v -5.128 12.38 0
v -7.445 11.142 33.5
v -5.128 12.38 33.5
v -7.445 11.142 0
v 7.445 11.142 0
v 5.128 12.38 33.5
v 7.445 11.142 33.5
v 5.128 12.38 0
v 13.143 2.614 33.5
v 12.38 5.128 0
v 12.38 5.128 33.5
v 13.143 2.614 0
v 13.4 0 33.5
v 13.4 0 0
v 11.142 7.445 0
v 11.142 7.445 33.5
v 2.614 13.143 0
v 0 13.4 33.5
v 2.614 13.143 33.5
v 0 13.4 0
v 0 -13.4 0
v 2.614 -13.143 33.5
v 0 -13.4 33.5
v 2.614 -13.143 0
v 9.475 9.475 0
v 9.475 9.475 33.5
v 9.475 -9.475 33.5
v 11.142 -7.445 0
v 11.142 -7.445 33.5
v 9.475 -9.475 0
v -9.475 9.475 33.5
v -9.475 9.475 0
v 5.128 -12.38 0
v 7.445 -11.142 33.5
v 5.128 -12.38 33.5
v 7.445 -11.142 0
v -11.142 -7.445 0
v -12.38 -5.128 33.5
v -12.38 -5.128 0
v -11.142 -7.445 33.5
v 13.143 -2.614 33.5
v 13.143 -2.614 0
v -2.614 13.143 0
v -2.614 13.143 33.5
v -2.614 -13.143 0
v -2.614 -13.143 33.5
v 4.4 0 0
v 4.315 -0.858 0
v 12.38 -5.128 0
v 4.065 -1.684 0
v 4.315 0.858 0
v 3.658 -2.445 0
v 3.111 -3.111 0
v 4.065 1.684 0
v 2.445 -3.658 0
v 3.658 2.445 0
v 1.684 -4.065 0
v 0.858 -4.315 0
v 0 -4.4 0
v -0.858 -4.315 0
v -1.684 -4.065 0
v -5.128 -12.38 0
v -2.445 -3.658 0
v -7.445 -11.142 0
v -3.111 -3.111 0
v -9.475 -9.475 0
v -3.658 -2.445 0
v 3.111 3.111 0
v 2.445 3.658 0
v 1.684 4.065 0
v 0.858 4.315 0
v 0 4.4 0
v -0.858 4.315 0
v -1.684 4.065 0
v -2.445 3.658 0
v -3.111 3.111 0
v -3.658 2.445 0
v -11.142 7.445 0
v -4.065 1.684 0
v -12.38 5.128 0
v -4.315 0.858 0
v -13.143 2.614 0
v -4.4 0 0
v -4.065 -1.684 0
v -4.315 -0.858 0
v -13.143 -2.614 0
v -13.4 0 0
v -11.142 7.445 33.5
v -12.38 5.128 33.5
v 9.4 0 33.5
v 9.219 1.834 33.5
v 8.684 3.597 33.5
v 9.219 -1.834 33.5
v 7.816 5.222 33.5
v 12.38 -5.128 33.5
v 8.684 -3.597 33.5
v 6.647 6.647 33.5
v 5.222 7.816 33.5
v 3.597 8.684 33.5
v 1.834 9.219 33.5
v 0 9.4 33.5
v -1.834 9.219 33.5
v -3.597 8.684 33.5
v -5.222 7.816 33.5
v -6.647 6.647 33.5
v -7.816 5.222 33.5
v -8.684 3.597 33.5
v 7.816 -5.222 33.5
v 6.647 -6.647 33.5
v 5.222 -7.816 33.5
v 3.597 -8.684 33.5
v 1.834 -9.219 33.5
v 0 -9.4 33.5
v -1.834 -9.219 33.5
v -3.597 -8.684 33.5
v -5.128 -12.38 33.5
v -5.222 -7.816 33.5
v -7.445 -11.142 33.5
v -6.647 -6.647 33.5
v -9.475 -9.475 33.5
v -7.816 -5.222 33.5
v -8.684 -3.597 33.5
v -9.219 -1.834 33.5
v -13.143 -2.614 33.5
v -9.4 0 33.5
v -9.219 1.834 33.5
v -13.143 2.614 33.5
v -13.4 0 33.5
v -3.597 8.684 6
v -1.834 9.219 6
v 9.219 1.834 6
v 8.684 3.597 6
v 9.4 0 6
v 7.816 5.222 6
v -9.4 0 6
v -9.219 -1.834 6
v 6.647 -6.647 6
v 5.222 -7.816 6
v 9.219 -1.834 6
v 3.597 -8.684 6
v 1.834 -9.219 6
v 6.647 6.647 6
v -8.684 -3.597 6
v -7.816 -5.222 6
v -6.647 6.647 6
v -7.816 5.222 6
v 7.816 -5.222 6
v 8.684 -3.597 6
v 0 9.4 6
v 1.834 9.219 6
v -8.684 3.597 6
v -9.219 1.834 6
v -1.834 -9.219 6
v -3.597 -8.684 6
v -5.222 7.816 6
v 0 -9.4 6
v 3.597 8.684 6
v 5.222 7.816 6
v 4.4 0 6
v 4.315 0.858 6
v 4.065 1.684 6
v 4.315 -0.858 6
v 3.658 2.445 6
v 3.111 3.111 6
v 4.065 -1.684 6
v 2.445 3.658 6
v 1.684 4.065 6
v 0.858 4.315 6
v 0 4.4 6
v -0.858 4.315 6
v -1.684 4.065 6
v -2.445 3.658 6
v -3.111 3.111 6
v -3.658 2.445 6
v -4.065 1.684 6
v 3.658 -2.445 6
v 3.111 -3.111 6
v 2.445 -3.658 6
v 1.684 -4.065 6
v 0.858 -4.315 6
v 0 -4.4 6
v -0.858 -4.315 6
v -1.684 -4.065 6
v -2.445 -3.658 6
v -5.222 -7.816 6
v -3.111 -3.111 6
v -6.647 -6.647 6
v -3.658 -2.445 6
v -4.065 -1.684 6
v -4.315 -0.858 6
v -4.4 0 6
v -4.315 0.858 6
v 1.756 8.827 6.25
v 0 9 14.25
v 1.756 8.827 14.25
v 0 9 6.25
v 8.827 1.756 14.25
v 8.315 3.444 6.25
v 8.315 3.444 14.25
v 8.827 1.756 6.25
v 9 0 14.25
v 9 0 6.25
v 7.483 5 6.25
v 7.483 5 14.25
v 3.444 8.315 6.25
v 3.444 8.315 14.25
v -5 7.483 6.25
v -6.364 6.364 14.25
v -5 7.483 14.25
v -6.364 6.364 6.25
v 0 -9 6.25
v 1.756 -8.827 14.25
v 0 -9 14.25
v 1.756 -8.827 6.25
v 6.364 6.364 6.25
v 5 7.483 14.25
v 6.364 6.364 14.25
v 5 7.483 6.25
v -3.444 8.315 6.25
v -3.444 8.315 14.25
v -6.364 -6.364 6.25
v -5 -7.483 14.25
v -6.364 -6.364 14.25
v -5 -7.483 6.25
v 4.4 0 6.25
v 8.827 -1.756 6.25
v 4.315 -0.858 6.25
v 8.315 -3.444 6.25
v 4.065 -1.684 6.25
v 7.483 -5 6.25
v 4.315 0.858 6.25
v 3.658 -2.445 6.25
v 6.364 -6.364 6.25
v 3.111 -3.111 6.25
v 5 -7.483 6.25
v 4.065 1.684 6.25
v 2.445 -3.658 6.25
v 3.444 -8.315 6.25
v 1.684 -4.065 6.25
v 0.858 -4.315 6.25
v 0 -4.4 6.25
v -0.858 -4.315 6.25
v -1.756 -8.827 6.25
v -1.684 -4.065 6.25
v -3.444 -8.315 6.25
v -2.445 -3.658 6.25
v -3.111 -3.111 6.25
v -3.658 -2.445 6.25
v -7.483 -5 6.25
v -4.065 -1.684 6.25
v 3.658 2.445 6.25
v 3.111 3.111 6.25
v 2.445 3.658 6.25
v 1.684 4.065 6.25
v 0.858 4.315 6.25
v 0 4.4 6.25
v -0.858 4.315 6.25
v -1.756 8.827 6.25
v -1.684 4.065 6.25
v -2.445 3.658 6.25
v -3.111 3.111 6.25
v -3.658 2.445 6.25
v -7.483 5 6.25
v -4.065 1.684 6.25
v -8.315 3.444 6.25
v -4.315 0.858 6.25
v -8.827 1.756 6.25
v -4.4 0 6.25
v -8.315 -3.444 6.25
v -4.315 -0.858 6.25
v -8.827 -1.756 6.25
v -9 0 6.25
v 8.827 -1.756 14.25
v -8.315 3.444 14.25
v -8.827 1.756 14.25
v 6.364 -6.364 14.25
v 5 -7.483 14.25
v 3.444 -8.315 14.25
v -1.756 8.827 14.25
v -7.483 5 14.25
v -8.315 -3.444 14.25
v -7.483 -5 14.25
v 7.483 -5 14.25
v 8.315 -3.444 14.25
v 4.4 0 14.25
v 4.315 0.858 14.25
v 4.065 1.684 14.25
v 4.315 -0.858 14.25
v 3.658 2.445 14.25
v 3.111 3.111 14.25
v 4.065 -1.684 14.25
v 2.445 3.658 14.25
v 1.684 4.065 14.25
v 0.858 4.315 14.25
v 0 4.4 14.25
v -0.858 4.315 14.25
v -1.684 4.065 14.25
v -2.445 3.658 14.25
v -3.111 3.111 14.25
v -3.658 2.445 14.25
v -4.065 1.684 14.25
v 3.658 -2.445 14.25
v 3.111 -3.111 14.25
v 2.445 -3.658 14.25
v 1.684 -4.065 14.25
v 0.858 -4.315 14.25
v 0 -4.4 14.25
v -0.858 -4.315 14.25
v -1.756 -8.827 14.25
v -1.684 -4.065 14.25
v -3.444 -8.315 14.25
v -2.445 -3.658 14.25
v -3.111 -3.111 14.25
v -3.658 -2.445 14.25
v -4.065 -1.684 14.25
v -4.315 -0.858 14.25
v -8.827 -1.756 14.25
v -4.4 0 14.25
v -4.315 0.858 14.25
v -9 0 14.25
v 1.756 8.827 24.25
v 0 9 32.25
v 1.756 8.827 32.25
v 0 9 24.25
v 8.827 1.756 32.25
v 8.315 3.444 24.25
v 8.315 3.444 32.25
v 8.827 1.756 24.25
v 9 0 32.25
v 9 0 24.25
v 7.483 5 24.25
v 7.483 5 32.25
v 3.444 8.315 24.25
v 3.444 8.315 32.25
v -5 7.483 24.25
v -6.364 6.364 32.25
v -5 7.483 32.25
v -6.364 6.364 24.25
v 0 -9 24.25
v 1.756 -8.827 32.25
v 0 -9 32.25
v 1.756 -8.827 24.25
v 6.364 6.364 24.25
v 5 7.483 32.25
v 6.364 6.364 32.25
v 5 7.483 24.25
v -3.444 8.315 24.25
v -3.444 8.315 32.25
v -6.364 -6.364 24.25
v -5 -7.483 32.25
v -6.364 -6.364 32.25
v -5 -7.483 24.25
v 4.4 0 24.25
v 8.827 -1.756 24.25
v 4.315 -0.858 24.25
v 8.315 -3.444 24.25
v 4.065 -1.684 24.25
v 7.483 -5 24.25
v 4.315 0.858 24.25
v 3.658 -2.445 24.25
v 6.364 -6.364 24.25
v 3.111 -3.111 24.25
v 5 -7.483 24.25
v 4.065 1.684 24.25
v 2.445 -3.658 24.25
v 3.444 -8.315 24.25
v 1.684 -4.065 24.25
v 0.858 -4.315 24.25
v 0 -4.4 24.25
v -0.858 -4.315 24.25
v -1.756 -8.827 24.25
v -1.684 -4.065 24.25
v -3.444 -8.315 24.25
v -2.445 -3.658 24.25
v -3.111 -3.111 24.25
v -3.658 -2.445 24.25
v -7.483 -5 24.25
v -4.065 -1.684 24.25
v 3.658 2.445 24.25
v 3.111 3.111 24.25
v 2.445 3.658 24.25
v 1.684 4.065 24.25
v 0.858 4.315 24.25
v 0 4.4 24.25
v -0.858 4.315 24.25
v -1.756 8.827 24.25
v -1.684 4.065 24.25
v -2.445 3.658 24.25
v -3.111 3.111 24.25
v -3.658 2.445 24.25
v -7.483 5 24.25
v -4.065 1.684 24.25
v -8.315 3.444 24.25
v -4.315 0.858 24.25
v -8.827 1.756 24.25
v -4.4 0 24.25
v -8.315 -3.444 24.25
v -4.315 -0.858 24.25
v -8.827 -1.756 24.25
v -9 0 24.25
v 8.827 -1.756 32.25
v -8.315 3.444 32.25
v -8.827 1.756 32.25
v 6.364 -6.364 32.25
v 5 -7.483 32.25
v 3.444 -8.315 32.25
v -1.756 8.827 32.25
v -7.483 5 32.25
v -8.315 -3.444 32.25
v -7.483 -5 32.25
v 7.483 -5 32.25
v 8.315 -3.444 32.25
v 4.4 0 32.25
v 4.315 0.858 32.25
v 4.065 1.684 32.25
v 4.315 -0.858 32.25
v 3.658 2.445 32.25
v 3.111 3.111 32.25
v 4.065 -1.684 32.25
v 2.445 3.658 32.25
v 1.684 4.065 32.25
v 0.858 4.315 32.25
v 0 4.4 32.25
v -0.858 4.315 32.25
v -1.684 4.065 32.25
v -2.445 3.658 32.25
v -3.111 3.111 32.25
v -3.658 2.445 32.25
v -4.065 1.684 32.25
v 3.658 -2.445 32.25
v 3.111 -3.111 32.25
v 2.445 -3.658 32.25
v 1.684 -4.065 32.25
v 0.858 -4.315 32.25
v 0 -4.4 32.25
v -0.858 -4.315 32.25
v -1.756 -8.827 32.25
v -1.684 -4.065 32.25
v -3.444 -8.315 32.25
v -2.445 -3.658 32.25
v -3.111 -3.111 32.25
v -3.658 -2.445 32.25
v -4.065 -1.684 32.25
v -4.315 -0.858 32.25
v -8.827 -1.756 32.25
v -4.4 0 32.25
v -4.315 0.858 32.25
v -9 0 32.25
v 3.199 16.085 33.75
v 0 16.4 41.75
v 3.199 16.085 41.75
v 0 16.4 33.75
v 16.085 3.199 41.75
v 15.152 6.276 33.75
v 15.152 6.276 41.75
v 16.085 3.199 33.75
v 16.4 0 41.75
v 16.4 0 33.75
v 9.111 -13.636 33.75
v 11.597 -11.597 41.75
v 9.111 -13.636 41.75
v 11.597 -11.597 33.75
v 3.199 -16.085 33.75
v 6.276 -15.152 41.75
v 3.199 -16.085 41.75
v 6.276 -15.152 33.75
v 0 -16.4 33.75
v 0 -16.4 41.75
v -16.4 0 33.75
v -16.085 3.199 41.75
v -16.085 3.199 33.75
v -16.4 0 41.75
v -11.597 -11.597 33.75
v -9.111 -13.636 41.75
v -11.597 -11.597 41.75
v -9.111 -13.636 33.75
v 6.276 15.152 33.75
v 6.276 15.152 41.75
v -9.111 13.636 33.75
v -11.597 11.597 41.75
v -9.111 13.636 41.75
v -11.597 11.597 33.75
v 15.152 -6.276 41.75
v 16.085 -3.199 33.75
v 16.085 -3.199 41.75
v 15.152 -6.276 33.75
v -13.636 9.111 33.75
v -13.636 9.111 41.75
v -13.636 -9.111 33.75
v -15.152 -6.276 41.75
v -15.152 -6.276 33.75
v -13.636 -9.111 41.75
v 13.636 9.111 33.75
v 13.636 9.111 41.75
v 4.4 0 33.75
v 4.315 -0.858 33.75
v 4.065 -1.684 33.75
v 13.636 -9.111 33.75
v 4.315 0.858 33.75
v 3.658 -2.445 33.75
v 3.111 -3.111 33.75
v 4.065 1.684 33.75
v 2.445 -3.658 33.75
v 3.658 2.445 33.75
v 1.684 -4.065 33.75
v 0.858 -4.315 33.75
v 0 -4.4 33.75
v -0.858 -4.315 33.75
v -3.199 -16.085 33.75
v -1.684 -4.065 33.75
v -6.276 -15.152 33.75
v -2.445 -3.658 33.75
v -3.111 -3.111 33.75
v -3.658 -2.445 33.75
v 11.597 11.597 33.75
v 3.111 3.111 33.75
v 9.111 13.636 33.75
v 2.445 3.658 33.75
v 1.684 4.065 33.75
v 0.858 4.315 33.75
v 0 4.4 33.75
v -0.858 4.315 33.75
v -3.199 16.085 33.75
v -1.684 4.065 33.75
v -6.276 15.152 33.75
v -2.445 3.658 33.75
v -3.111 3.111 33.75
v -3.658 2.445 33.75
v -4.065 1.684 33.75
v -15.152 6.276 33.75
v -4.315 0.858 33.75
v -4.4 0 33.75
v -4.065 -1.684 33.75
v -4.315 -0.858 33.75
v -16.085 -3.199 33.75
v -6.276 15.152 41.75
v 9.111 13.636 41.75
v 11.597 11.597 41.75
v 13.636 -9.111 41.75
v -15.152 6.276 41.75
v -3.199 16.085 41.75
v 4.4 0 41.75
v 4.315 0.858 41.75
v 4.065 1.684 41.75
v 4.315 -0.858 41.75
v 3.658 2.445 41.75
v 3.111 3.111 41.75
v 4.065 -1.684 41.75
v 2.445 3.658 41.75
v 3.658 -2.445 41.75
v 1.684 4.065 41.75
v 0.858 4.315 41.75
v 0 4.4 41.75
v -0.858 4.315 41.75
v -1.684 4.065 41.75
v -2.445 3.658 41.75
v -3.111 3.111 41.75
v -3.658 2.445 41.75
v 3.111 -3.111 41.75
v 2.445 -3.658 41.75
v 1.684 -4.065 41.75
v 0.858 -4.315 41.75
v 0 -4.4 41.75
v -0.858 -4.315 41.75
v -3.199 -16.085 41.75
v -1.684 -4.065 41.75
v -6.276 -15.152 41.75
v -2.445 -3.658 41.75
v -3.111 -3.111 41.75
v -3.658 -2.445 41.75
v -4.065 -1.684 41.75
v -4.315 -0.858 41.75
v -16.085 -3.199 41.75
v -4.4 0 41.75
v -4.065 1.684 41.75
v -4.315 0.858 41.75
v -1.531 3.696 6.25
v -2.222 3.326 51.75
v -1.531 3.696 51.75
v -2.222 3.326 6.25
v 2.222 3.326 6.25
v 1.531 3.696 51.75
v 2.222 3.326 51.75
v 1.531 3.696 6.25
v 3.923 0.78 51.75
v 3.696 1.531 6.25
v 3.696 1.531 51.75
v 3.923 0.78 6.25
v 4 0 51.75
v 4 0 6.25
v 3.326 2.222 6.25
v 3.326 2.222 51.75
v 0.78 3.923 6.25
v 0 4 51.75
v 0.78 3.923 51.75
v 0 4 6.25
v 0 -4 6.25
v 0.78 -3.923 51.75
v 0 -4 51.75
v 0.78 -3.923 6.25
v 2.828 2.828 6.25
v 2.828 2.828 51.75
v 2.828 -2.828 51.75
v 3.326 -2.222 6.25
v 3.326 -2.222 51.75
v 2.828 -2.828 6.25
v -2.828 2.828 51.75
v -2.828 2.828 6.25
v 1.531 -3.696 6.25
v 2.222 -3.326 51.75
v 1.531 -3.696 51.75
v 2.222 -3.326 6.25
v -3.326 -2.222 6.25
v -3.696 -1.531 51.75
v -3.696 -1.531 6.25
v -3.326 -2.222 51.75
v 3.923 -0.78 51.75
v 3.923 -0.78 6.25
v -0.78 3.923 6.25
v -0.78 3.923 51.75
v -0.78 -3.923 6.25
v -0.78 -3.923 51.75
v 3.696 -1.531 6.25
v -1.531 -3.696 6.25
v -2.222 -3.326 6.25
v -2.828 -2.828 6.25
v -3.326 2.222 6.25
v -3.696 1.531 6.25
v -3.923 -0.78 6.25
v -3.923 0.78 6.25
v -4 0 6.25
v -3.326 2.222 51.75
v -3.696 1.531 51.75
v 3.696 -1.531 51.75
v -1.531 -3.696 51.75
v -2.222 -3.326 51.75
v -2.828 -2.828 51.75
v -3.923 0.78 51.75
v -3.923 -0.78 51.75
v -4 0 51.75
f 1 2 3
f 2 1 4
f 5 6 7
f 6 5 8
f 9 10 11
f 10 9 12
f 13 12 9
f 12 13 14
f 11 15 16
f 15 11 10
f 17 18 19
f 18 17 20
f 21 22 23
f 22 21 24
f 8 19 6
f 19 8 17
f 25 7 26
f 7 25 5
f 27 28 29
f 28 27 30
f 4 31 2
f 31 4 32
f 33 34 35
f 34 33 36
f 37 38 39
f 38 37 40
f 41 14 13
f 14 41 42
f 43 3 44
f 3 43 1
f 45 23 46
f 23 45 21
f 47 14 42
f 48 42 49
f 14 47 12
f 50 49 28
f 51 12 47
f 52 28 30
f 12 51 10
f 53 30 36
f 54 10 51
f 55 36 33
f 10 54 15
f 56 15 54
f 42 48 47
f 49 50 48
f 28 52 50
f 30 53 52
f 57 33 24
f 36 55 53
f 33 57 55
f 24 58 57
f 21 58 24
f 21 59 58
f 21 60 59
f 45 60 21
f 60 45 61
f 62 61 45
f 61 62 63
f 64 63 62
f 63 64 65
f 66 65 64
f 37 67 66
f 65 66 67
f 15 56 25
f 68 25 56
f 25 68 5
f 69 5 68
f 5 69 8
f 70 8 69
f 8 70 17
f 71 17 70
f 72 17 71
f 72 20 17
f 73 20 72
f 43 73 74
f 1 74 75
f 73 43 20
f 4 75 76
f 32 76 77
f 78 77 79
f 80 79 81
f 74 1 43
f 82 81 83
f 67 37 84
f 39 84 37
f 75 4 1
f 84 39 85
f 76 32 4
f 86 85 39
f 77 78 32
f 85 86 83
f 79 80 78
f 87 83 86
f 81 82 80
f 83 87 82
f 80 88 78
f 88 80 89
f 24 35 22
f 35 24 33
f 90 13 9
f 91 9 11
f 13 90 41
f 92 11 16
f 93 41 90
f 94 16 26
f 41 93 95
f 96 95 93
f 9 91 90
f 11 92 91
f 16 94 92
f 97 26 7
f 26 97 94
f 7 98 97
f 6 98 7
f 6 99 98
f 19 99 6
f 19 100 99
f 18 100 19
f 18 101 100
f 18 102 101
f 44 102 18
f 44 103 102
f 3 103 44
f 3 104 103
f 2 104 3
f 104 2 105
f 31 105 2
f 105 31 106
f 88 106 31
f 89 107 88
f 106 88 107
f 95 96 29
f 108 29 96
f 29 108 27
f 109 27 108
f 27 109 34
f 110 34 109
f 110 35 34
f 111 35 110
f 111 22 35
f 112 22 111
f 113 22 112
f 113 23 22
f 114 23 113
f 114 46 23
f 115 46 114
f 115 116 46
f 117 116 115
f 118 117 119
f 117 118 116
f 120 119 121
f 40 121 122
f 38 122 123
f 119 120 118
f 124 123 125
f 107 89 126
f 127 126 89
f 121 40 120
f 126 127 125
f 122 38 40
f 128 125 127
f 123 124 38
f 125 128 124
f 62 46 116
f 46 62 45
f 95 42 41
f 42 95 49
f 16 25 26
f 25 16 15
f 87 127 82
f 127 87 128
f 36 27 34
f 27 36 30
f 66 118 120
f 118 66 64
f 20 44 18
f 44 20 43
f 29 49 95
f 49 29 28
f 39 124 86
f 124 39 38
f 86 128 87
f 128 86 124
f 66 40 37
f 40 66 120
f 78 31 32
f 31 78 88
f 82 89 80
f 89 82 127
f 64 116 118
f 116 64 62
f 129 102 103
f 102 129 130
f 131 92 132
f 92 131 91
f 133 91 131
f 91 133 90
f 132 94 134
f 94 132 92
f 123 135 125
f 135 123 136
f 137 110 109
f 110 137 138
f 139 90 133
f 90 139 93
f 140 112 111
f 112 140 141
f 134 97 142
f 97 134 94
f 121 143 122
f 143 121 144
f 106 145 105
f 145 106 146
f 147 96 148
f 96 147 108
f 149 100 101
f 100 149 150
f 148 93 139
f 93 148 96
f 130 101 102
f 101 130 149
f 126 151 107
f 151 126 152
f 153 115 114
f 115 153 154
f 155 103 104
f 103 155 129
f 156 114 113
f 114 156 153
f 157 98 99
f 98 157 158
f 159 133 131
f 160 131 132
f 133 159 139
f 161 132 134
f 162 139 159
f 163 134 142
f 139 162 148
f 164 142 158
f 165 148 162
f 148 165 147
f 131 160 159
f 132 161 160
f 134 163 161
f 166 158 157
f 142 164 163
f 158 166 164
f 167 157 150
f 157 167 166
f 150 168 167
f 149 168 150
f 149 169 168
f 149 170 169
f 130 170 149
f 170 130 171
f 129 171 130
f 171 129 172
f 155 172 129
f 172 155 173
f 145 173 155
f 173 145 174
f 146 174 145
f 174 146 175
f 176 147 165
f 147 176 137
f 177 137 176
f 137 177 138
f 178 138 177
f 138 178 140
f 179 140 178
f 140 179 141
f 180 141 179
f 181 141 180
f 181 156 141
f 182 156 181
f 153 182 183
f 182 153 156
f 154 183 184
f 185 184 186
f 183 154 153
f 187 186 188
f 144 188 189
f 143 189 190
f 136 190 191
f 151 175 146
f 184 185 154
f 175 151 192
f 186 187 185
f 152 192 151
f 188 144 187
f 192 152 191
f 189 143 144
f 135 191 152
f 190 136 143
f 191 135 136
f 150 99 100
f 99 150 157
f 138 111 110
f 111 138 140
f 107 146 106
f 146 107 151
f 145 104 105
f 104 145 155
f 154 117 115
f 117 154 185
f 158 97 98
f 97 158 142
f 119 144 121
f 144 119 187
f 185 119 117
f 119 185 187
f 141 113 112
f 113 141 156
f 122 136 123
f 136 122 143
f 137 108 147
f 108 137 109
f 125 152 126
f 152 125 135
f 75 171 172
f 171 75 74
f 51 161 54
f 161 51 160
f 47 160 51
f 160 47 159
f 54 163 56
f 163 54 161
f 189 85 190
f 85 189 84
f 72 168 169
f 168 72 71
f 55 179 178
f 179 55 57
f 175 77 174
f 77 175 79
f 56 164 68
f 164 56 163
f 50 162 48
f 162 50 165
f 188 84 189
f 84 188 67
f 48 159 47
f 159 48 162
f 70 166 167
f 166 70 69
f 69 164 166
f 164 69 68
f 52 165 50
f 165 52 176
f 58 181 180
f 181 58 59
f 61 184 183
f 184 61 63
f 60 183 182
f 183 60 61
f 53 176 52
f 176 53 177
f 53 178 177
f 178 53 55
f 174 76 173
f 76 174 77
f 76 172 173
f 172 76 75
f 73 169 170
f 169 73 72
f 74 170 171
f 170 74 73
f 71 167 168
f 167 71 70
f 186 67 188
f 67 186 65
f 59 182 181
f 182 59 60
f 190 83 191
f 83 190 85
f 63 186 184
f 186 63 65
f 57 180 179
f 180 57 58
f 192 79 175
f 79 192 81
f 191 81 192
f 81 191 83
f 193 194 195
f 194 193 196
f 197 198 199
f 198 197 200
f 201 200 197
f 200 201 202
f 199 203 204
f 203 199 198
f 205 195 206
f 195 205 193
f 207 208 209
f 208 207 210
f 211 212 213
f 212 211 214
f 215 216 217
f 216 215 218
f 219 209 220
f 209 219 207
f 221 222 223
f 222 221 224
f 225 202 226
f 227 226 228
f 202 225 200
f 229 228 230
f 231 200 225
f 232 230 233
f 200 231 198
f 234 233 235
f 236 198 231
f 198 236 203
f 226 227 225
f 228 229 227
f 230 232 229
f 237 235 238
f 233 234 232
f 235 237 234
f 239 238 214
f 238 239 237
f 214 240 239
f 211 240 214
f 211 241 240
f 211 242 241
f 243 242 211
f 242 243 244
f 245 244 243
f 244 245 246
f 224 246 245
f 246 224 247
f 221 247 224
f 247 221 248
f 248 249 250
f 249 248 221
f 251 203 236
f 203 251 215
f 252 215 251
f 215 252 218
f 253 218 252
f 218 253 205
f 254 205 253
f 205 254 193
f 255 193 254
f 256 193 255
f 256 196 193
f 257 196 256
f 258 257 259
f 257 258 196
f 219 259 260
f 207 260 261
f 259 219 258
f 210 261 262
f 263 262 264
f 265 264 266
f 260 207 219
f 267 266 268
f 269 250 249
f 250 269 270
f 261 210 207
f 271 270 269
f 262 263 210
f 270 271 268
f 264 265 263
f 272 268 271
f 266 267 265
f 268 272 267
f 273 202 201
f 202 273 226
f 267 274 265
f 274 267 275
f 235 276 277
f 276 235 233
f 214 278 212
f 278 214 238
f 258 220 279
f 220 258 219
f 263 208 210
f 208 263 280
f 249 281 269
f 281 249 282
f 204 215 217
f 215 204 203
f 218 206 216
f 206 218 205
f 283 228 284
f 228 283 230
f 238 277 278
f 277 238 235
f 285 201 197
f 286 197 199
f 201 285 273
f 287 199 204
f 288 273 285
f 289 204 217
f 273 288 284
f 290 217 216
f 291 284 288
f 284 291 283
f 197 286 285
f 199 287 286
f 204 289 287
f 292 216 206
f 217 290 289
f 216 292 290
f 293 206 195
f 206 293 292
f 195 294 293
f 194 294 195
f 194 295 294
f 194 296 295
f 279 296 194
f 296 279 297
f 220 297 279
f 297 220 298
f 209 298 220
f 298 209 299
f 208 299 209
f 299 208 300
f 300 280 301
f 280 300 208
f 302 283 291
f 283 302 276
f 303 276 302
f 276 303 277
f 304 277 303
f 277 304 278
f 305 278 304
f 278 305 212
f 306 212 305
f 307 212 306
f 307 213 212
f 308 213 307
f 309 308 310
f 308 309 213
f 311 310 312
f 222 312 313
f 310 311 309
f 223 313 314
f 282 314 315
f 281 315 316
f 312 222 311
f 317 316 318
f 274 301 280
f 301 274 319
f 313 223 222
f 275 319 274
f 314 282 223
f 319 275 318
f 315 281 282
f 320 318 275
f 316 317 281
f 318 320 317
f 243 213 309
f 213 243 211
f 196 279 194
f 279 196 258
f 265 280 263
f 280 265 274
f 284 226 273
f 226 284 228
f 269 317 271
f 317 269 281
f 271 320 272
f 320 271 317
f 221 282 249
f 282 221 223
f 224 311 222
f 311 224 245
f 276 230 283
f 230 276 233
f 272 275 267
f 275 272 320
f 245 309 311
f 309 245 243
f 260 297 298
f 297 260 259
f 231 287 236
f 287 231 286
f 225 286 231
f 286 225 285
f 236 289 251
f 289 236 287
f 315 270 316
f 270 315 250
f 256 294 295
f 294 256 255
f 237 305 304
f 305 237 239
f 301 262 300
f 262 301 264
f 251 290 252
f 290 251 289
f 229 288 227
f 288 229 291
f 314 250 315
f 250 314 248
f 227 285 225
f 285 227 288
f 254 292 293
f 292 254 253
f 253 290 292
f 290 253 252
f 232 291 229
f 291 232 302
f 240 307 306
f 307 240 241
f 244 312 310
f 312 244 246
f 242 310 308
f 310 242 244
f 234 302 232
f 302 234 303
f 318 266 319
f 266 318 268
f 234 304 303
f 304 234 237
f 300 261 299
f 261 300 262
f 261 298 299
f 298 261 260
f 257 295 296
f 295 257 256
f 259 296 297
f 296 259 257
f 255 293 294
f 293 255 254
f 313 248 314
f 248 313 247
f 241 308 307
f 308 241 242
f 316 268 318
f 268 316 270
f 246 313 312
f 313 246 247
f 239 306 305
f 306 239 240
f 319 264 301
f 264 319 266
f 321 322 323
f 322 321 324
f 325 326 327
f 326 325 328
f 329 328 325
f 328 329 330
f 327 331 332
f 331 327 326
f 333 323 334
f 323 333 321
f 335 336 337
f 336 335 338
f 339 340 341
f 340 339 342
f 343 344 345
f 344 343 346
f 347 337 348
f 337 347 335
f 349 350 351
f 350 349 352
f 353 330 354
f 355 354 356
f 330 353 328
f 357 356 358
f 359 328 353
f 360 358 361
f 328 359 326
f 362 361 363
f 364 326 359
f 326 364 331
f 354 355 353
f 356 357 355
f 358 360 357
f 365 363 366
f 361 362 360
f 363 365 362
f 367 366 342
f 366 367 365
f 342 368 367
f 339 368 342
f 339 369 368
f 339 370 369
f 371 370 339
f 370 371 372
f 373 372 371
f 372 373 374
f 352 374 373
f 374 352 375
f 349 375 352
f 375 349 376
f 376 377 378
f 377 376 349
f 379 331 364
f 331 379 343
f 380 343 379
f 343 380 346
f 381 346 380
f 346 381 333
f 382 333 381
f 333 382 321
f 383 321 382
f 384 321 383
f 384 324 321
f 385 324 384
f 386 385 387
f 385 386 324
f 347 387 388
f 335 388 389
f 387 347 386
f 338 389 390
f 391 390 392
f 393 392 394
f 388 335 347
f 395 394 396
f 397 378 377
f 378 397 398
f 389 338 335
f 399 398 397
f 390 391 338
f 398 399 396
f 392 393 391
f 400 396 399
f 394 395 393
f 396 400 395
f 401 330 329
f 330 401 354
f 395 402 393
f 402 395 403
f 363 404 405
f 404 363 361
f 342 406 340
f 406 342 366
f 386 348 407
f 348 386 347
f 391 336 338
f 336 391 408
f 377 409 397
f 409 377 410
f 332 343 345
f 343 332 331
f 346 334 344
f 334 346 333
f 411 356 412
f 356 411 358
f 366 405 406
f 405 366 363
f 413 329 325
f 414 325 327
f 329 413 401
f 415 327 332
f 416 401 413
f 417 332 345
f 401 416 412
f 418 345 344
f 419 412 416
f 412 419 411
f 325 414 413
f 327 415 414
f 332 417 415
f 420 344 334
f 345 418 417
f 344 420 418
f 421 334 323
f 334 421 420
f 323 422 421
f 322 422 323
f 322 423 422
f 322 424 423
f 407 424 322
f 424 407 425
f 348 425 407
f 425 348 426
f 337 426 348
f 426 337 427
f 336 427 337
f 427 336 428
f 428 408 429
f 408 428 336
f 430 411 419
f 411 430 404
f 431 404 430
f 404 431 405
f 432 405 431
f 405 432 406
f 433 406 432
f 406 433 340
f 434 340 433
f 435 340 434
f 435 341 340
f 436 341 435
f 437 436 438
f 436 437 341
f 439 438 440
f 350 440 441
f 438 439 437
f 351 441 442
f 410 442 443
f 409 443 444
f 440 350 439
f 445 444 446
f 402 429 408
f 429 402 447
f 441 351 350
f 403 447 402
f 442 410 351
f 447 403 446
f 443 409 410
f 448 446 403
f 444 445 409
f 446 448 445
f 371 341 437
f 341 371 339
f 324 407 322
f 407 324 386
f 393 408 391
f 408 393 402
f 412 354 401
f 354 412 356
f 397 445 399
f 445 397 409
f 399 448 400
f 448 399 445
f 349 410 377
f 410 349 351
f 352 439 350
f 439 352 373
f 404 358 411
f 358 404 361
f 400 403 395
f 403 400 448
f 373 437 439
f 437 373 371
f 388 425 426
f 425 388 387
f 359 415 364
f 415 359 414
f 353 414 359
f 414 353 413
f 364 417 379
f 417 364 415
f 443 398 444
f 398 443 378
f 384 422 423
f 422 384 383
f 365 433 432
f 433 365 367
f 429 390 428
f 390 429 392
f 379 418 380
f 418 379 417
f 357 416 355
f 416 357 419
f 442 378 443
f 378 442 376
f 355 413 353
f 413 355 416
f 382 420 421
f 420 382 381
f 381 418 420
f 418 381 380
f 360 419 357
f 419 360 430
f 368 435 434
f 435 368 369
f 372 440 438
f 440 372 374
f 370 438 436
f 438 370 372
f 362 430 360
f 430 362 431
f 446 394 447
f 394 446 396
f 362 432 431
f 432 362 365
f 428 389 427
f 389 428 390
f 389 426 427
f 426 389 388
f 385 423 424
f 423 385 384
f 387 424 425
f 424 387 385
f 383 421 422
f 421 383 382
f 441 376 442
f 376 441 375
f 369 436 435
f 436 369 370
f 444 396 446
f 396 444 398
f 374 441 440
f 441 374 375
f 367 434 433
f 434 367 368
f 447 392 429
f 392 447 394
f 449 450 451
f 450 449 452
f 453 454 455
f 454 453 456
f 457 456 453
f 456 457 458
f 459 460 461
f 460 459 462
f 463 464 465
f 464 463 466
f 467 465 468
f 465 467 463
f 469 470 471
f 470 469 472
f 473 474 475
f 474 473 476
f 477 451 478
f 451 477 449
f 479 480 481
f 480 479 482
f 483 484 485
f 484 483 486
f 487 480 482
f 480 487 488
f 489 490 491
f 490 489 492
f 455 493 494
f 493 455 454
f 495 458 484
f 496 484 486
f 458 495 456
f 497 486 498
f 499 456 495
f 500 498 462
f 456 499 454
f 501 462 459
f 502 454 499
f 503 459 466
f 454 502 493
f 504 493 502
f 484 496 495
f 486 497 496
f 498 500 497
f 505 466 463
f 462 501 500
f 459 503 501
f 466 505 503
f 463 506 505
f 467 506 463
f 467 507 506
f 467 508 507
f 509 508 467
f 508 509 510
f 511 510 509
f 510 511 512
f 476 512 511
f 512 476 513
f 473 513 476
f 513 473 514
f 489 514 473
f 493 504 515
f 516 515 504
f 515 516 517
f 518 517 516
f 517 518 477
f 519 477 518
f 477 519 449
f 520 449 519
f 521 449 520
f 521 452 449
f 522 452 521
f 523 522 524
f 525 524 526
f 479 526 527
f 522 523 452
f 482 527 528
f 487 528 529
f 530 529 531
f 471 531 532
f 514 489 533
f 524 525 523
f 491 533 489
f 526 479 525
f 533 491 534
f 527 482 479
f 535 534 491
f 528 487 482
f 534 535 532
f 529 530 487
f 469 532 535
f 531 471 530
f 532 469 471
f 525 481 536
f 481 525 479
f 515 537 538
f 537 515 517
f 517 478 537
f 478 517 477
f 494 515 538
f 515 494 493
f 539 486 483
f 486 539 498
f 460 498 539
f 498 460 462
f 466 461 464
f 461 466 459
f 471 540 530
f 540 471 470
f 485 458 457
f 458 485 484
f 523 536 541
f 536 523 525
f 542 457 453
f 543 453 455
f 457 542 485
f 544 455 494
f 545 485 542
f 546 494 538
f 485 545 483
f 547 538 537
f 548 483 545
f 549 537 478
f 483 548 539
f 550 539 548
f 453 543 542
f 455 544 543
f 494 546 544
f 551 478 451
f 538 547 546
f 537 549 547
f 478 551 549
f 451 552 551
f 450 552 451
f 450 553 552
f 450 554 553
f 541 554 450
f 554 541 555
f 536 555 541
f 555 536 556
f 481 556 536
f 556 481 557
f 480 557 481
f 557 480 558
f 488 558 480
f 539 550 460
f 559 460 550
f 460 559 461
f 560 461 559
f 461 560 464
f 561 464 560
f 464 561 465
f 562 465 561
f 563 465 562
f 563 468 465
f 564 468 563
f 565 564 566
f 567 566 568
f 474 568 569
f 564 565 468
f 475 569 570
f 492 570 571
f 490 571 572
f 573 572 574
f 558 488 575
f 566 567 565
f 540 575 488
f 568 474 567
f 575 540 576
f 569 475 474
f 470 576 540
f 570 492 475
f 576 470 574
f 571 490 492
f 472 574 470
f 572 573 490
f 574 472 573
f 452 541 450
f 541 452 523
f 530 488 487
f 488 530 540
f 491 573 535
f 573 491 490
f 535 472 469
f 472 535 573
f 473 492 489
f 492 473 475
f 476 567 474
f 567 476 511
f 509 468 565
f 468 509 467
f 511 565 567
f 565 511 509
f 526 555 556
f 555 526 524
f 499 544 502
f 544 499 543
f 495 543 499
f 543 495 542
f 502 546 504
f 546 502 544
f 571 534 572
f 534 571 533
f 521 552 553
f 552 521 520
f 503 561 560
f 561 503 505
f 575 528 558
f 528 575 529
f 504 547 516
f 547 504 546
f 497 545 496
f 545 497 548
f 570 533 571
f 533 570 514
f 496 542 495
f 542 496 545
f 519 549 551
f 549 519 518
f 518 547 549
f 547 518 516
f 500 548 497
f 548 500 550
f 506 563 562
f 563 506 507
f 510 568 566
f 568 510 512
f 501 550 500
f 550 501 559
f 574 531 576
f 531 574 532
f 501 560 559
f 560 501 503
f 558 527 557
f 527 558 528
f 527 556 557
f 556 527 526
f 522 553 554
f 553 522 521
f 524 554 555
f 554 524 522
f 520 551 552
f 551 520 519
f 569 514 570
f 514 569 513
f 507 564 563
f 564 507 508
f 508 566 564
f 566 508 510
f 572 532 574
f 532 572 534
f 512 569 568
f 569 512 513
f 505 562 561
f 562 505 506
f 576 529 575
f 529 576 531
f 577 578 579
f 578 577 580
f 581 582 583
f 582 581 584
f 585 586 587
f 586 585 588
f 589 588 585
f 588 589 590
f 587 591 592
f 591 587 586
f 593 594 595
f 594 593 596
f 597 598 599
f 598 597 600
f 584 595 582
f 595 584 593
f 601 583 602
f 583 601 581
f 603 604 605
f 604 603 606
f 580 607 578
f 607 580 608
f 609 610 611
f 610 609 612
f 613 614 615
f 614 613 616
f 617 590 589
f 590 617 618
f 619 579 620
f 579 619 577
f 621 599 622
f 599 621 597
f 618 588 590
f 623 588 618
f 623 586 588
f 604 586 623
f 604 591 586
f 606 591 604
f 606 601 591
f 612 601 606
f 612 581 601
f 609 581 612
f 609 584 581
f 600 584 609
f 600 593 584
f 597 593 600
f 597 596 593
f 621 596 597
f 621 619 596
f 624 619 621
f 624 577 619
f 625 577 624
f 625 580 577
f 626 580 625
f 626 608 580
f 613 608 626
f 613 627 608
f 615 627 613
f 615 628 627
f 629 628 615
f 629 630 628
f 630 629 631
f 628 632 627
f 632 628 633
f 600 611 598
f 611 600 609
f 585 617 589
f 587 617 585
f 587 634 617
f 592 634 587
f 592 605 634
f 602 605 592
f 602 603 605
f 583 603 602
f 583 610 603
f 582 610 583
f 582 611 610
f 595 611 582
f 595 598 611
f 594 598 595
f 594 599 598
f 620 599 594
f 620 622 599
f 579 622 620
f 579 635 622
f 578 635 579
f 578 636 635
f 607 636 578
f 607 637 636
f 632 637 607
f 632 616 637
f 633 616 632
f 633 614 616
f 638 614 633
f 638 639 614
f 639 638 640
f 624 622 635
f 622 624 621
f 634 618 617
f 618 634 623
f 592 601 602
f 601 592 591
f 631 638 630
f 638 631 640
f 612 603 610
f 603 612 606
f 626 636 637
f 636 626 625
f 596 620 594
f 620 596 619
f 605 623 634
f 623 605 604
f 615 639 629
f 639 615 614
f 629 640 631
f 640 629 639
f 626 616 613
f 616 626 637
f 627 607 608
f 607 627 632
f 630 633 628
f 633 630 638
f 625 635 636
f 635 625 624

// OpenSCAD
$fn = 32;

// ------------------------------------------------------------------------
// Shaft station: cup d26.8 x 33.5 mm, shaft d8
// Every part is its own module, assembly() places every instance.
// ------------------------------------------------------------------------

// --- part 1 ---
module housing_cup() {
  difference() {
    cylinder(h = 33.5, d = 26.8);
    translate([0, 0, 6]) cylinder(h = 28.5, d = 18.8);
    translate([0, 0, -1]) cylinder(h = 8, d = 8.8);
  }
}

// --- part 2 ---
module bearing_lower() {
  difference() {
      translate([0, 0, 0]) cylinder(h = 8, d = 18);
      translate([0, 0, -1]) cylinder(h = 10, d = 8.8);
    }
}

// --- part 3 ---
module bearing_upper() {
  difference() {
      translate([0, 0, 0]) cylinder(h = 8, d = 18);
      translate([0, 0, -1]) cylinder(h = 10, d = 8.8);
    }
}

// --- part 4 ---
module station_shaft() {
  translate([0, 0, -22.75]) cylinder(h = 45.5, d = 8);
}

// --- part 5 ---
module station_cover() {
  difference() {
    cylinder(h = 8, d = 32.8);
    translate([0, 0, -1]) cylinder(h = 10, d = 8.8);
  }
}

// --- assembly ---
module assembly() {
  color([0.80, 0.24, 0.20]) translate([0, 0, 0]) rotate([0, 0, 0]) housing_cup();
  color([0.20, 0.45, 0.75]) translate([0, 0, 6.25]) rotate([0, 0, 0]) bearing_lower();
  color([0.25, 0.62, 0.32]) translate([0, 0, 24.25]) rotate([0, 0, 0]) bearing_upper();
  color([0.92, 0.70, 0.18]) translate([0, 0, 29]) rotate([0, 0, 0]) station_shaft();
  color([0.58, 0.35, 0.70]) translate([0, 0, 33.75]) rotate([0, 0, 0]) station_cover();
}

assembly();
